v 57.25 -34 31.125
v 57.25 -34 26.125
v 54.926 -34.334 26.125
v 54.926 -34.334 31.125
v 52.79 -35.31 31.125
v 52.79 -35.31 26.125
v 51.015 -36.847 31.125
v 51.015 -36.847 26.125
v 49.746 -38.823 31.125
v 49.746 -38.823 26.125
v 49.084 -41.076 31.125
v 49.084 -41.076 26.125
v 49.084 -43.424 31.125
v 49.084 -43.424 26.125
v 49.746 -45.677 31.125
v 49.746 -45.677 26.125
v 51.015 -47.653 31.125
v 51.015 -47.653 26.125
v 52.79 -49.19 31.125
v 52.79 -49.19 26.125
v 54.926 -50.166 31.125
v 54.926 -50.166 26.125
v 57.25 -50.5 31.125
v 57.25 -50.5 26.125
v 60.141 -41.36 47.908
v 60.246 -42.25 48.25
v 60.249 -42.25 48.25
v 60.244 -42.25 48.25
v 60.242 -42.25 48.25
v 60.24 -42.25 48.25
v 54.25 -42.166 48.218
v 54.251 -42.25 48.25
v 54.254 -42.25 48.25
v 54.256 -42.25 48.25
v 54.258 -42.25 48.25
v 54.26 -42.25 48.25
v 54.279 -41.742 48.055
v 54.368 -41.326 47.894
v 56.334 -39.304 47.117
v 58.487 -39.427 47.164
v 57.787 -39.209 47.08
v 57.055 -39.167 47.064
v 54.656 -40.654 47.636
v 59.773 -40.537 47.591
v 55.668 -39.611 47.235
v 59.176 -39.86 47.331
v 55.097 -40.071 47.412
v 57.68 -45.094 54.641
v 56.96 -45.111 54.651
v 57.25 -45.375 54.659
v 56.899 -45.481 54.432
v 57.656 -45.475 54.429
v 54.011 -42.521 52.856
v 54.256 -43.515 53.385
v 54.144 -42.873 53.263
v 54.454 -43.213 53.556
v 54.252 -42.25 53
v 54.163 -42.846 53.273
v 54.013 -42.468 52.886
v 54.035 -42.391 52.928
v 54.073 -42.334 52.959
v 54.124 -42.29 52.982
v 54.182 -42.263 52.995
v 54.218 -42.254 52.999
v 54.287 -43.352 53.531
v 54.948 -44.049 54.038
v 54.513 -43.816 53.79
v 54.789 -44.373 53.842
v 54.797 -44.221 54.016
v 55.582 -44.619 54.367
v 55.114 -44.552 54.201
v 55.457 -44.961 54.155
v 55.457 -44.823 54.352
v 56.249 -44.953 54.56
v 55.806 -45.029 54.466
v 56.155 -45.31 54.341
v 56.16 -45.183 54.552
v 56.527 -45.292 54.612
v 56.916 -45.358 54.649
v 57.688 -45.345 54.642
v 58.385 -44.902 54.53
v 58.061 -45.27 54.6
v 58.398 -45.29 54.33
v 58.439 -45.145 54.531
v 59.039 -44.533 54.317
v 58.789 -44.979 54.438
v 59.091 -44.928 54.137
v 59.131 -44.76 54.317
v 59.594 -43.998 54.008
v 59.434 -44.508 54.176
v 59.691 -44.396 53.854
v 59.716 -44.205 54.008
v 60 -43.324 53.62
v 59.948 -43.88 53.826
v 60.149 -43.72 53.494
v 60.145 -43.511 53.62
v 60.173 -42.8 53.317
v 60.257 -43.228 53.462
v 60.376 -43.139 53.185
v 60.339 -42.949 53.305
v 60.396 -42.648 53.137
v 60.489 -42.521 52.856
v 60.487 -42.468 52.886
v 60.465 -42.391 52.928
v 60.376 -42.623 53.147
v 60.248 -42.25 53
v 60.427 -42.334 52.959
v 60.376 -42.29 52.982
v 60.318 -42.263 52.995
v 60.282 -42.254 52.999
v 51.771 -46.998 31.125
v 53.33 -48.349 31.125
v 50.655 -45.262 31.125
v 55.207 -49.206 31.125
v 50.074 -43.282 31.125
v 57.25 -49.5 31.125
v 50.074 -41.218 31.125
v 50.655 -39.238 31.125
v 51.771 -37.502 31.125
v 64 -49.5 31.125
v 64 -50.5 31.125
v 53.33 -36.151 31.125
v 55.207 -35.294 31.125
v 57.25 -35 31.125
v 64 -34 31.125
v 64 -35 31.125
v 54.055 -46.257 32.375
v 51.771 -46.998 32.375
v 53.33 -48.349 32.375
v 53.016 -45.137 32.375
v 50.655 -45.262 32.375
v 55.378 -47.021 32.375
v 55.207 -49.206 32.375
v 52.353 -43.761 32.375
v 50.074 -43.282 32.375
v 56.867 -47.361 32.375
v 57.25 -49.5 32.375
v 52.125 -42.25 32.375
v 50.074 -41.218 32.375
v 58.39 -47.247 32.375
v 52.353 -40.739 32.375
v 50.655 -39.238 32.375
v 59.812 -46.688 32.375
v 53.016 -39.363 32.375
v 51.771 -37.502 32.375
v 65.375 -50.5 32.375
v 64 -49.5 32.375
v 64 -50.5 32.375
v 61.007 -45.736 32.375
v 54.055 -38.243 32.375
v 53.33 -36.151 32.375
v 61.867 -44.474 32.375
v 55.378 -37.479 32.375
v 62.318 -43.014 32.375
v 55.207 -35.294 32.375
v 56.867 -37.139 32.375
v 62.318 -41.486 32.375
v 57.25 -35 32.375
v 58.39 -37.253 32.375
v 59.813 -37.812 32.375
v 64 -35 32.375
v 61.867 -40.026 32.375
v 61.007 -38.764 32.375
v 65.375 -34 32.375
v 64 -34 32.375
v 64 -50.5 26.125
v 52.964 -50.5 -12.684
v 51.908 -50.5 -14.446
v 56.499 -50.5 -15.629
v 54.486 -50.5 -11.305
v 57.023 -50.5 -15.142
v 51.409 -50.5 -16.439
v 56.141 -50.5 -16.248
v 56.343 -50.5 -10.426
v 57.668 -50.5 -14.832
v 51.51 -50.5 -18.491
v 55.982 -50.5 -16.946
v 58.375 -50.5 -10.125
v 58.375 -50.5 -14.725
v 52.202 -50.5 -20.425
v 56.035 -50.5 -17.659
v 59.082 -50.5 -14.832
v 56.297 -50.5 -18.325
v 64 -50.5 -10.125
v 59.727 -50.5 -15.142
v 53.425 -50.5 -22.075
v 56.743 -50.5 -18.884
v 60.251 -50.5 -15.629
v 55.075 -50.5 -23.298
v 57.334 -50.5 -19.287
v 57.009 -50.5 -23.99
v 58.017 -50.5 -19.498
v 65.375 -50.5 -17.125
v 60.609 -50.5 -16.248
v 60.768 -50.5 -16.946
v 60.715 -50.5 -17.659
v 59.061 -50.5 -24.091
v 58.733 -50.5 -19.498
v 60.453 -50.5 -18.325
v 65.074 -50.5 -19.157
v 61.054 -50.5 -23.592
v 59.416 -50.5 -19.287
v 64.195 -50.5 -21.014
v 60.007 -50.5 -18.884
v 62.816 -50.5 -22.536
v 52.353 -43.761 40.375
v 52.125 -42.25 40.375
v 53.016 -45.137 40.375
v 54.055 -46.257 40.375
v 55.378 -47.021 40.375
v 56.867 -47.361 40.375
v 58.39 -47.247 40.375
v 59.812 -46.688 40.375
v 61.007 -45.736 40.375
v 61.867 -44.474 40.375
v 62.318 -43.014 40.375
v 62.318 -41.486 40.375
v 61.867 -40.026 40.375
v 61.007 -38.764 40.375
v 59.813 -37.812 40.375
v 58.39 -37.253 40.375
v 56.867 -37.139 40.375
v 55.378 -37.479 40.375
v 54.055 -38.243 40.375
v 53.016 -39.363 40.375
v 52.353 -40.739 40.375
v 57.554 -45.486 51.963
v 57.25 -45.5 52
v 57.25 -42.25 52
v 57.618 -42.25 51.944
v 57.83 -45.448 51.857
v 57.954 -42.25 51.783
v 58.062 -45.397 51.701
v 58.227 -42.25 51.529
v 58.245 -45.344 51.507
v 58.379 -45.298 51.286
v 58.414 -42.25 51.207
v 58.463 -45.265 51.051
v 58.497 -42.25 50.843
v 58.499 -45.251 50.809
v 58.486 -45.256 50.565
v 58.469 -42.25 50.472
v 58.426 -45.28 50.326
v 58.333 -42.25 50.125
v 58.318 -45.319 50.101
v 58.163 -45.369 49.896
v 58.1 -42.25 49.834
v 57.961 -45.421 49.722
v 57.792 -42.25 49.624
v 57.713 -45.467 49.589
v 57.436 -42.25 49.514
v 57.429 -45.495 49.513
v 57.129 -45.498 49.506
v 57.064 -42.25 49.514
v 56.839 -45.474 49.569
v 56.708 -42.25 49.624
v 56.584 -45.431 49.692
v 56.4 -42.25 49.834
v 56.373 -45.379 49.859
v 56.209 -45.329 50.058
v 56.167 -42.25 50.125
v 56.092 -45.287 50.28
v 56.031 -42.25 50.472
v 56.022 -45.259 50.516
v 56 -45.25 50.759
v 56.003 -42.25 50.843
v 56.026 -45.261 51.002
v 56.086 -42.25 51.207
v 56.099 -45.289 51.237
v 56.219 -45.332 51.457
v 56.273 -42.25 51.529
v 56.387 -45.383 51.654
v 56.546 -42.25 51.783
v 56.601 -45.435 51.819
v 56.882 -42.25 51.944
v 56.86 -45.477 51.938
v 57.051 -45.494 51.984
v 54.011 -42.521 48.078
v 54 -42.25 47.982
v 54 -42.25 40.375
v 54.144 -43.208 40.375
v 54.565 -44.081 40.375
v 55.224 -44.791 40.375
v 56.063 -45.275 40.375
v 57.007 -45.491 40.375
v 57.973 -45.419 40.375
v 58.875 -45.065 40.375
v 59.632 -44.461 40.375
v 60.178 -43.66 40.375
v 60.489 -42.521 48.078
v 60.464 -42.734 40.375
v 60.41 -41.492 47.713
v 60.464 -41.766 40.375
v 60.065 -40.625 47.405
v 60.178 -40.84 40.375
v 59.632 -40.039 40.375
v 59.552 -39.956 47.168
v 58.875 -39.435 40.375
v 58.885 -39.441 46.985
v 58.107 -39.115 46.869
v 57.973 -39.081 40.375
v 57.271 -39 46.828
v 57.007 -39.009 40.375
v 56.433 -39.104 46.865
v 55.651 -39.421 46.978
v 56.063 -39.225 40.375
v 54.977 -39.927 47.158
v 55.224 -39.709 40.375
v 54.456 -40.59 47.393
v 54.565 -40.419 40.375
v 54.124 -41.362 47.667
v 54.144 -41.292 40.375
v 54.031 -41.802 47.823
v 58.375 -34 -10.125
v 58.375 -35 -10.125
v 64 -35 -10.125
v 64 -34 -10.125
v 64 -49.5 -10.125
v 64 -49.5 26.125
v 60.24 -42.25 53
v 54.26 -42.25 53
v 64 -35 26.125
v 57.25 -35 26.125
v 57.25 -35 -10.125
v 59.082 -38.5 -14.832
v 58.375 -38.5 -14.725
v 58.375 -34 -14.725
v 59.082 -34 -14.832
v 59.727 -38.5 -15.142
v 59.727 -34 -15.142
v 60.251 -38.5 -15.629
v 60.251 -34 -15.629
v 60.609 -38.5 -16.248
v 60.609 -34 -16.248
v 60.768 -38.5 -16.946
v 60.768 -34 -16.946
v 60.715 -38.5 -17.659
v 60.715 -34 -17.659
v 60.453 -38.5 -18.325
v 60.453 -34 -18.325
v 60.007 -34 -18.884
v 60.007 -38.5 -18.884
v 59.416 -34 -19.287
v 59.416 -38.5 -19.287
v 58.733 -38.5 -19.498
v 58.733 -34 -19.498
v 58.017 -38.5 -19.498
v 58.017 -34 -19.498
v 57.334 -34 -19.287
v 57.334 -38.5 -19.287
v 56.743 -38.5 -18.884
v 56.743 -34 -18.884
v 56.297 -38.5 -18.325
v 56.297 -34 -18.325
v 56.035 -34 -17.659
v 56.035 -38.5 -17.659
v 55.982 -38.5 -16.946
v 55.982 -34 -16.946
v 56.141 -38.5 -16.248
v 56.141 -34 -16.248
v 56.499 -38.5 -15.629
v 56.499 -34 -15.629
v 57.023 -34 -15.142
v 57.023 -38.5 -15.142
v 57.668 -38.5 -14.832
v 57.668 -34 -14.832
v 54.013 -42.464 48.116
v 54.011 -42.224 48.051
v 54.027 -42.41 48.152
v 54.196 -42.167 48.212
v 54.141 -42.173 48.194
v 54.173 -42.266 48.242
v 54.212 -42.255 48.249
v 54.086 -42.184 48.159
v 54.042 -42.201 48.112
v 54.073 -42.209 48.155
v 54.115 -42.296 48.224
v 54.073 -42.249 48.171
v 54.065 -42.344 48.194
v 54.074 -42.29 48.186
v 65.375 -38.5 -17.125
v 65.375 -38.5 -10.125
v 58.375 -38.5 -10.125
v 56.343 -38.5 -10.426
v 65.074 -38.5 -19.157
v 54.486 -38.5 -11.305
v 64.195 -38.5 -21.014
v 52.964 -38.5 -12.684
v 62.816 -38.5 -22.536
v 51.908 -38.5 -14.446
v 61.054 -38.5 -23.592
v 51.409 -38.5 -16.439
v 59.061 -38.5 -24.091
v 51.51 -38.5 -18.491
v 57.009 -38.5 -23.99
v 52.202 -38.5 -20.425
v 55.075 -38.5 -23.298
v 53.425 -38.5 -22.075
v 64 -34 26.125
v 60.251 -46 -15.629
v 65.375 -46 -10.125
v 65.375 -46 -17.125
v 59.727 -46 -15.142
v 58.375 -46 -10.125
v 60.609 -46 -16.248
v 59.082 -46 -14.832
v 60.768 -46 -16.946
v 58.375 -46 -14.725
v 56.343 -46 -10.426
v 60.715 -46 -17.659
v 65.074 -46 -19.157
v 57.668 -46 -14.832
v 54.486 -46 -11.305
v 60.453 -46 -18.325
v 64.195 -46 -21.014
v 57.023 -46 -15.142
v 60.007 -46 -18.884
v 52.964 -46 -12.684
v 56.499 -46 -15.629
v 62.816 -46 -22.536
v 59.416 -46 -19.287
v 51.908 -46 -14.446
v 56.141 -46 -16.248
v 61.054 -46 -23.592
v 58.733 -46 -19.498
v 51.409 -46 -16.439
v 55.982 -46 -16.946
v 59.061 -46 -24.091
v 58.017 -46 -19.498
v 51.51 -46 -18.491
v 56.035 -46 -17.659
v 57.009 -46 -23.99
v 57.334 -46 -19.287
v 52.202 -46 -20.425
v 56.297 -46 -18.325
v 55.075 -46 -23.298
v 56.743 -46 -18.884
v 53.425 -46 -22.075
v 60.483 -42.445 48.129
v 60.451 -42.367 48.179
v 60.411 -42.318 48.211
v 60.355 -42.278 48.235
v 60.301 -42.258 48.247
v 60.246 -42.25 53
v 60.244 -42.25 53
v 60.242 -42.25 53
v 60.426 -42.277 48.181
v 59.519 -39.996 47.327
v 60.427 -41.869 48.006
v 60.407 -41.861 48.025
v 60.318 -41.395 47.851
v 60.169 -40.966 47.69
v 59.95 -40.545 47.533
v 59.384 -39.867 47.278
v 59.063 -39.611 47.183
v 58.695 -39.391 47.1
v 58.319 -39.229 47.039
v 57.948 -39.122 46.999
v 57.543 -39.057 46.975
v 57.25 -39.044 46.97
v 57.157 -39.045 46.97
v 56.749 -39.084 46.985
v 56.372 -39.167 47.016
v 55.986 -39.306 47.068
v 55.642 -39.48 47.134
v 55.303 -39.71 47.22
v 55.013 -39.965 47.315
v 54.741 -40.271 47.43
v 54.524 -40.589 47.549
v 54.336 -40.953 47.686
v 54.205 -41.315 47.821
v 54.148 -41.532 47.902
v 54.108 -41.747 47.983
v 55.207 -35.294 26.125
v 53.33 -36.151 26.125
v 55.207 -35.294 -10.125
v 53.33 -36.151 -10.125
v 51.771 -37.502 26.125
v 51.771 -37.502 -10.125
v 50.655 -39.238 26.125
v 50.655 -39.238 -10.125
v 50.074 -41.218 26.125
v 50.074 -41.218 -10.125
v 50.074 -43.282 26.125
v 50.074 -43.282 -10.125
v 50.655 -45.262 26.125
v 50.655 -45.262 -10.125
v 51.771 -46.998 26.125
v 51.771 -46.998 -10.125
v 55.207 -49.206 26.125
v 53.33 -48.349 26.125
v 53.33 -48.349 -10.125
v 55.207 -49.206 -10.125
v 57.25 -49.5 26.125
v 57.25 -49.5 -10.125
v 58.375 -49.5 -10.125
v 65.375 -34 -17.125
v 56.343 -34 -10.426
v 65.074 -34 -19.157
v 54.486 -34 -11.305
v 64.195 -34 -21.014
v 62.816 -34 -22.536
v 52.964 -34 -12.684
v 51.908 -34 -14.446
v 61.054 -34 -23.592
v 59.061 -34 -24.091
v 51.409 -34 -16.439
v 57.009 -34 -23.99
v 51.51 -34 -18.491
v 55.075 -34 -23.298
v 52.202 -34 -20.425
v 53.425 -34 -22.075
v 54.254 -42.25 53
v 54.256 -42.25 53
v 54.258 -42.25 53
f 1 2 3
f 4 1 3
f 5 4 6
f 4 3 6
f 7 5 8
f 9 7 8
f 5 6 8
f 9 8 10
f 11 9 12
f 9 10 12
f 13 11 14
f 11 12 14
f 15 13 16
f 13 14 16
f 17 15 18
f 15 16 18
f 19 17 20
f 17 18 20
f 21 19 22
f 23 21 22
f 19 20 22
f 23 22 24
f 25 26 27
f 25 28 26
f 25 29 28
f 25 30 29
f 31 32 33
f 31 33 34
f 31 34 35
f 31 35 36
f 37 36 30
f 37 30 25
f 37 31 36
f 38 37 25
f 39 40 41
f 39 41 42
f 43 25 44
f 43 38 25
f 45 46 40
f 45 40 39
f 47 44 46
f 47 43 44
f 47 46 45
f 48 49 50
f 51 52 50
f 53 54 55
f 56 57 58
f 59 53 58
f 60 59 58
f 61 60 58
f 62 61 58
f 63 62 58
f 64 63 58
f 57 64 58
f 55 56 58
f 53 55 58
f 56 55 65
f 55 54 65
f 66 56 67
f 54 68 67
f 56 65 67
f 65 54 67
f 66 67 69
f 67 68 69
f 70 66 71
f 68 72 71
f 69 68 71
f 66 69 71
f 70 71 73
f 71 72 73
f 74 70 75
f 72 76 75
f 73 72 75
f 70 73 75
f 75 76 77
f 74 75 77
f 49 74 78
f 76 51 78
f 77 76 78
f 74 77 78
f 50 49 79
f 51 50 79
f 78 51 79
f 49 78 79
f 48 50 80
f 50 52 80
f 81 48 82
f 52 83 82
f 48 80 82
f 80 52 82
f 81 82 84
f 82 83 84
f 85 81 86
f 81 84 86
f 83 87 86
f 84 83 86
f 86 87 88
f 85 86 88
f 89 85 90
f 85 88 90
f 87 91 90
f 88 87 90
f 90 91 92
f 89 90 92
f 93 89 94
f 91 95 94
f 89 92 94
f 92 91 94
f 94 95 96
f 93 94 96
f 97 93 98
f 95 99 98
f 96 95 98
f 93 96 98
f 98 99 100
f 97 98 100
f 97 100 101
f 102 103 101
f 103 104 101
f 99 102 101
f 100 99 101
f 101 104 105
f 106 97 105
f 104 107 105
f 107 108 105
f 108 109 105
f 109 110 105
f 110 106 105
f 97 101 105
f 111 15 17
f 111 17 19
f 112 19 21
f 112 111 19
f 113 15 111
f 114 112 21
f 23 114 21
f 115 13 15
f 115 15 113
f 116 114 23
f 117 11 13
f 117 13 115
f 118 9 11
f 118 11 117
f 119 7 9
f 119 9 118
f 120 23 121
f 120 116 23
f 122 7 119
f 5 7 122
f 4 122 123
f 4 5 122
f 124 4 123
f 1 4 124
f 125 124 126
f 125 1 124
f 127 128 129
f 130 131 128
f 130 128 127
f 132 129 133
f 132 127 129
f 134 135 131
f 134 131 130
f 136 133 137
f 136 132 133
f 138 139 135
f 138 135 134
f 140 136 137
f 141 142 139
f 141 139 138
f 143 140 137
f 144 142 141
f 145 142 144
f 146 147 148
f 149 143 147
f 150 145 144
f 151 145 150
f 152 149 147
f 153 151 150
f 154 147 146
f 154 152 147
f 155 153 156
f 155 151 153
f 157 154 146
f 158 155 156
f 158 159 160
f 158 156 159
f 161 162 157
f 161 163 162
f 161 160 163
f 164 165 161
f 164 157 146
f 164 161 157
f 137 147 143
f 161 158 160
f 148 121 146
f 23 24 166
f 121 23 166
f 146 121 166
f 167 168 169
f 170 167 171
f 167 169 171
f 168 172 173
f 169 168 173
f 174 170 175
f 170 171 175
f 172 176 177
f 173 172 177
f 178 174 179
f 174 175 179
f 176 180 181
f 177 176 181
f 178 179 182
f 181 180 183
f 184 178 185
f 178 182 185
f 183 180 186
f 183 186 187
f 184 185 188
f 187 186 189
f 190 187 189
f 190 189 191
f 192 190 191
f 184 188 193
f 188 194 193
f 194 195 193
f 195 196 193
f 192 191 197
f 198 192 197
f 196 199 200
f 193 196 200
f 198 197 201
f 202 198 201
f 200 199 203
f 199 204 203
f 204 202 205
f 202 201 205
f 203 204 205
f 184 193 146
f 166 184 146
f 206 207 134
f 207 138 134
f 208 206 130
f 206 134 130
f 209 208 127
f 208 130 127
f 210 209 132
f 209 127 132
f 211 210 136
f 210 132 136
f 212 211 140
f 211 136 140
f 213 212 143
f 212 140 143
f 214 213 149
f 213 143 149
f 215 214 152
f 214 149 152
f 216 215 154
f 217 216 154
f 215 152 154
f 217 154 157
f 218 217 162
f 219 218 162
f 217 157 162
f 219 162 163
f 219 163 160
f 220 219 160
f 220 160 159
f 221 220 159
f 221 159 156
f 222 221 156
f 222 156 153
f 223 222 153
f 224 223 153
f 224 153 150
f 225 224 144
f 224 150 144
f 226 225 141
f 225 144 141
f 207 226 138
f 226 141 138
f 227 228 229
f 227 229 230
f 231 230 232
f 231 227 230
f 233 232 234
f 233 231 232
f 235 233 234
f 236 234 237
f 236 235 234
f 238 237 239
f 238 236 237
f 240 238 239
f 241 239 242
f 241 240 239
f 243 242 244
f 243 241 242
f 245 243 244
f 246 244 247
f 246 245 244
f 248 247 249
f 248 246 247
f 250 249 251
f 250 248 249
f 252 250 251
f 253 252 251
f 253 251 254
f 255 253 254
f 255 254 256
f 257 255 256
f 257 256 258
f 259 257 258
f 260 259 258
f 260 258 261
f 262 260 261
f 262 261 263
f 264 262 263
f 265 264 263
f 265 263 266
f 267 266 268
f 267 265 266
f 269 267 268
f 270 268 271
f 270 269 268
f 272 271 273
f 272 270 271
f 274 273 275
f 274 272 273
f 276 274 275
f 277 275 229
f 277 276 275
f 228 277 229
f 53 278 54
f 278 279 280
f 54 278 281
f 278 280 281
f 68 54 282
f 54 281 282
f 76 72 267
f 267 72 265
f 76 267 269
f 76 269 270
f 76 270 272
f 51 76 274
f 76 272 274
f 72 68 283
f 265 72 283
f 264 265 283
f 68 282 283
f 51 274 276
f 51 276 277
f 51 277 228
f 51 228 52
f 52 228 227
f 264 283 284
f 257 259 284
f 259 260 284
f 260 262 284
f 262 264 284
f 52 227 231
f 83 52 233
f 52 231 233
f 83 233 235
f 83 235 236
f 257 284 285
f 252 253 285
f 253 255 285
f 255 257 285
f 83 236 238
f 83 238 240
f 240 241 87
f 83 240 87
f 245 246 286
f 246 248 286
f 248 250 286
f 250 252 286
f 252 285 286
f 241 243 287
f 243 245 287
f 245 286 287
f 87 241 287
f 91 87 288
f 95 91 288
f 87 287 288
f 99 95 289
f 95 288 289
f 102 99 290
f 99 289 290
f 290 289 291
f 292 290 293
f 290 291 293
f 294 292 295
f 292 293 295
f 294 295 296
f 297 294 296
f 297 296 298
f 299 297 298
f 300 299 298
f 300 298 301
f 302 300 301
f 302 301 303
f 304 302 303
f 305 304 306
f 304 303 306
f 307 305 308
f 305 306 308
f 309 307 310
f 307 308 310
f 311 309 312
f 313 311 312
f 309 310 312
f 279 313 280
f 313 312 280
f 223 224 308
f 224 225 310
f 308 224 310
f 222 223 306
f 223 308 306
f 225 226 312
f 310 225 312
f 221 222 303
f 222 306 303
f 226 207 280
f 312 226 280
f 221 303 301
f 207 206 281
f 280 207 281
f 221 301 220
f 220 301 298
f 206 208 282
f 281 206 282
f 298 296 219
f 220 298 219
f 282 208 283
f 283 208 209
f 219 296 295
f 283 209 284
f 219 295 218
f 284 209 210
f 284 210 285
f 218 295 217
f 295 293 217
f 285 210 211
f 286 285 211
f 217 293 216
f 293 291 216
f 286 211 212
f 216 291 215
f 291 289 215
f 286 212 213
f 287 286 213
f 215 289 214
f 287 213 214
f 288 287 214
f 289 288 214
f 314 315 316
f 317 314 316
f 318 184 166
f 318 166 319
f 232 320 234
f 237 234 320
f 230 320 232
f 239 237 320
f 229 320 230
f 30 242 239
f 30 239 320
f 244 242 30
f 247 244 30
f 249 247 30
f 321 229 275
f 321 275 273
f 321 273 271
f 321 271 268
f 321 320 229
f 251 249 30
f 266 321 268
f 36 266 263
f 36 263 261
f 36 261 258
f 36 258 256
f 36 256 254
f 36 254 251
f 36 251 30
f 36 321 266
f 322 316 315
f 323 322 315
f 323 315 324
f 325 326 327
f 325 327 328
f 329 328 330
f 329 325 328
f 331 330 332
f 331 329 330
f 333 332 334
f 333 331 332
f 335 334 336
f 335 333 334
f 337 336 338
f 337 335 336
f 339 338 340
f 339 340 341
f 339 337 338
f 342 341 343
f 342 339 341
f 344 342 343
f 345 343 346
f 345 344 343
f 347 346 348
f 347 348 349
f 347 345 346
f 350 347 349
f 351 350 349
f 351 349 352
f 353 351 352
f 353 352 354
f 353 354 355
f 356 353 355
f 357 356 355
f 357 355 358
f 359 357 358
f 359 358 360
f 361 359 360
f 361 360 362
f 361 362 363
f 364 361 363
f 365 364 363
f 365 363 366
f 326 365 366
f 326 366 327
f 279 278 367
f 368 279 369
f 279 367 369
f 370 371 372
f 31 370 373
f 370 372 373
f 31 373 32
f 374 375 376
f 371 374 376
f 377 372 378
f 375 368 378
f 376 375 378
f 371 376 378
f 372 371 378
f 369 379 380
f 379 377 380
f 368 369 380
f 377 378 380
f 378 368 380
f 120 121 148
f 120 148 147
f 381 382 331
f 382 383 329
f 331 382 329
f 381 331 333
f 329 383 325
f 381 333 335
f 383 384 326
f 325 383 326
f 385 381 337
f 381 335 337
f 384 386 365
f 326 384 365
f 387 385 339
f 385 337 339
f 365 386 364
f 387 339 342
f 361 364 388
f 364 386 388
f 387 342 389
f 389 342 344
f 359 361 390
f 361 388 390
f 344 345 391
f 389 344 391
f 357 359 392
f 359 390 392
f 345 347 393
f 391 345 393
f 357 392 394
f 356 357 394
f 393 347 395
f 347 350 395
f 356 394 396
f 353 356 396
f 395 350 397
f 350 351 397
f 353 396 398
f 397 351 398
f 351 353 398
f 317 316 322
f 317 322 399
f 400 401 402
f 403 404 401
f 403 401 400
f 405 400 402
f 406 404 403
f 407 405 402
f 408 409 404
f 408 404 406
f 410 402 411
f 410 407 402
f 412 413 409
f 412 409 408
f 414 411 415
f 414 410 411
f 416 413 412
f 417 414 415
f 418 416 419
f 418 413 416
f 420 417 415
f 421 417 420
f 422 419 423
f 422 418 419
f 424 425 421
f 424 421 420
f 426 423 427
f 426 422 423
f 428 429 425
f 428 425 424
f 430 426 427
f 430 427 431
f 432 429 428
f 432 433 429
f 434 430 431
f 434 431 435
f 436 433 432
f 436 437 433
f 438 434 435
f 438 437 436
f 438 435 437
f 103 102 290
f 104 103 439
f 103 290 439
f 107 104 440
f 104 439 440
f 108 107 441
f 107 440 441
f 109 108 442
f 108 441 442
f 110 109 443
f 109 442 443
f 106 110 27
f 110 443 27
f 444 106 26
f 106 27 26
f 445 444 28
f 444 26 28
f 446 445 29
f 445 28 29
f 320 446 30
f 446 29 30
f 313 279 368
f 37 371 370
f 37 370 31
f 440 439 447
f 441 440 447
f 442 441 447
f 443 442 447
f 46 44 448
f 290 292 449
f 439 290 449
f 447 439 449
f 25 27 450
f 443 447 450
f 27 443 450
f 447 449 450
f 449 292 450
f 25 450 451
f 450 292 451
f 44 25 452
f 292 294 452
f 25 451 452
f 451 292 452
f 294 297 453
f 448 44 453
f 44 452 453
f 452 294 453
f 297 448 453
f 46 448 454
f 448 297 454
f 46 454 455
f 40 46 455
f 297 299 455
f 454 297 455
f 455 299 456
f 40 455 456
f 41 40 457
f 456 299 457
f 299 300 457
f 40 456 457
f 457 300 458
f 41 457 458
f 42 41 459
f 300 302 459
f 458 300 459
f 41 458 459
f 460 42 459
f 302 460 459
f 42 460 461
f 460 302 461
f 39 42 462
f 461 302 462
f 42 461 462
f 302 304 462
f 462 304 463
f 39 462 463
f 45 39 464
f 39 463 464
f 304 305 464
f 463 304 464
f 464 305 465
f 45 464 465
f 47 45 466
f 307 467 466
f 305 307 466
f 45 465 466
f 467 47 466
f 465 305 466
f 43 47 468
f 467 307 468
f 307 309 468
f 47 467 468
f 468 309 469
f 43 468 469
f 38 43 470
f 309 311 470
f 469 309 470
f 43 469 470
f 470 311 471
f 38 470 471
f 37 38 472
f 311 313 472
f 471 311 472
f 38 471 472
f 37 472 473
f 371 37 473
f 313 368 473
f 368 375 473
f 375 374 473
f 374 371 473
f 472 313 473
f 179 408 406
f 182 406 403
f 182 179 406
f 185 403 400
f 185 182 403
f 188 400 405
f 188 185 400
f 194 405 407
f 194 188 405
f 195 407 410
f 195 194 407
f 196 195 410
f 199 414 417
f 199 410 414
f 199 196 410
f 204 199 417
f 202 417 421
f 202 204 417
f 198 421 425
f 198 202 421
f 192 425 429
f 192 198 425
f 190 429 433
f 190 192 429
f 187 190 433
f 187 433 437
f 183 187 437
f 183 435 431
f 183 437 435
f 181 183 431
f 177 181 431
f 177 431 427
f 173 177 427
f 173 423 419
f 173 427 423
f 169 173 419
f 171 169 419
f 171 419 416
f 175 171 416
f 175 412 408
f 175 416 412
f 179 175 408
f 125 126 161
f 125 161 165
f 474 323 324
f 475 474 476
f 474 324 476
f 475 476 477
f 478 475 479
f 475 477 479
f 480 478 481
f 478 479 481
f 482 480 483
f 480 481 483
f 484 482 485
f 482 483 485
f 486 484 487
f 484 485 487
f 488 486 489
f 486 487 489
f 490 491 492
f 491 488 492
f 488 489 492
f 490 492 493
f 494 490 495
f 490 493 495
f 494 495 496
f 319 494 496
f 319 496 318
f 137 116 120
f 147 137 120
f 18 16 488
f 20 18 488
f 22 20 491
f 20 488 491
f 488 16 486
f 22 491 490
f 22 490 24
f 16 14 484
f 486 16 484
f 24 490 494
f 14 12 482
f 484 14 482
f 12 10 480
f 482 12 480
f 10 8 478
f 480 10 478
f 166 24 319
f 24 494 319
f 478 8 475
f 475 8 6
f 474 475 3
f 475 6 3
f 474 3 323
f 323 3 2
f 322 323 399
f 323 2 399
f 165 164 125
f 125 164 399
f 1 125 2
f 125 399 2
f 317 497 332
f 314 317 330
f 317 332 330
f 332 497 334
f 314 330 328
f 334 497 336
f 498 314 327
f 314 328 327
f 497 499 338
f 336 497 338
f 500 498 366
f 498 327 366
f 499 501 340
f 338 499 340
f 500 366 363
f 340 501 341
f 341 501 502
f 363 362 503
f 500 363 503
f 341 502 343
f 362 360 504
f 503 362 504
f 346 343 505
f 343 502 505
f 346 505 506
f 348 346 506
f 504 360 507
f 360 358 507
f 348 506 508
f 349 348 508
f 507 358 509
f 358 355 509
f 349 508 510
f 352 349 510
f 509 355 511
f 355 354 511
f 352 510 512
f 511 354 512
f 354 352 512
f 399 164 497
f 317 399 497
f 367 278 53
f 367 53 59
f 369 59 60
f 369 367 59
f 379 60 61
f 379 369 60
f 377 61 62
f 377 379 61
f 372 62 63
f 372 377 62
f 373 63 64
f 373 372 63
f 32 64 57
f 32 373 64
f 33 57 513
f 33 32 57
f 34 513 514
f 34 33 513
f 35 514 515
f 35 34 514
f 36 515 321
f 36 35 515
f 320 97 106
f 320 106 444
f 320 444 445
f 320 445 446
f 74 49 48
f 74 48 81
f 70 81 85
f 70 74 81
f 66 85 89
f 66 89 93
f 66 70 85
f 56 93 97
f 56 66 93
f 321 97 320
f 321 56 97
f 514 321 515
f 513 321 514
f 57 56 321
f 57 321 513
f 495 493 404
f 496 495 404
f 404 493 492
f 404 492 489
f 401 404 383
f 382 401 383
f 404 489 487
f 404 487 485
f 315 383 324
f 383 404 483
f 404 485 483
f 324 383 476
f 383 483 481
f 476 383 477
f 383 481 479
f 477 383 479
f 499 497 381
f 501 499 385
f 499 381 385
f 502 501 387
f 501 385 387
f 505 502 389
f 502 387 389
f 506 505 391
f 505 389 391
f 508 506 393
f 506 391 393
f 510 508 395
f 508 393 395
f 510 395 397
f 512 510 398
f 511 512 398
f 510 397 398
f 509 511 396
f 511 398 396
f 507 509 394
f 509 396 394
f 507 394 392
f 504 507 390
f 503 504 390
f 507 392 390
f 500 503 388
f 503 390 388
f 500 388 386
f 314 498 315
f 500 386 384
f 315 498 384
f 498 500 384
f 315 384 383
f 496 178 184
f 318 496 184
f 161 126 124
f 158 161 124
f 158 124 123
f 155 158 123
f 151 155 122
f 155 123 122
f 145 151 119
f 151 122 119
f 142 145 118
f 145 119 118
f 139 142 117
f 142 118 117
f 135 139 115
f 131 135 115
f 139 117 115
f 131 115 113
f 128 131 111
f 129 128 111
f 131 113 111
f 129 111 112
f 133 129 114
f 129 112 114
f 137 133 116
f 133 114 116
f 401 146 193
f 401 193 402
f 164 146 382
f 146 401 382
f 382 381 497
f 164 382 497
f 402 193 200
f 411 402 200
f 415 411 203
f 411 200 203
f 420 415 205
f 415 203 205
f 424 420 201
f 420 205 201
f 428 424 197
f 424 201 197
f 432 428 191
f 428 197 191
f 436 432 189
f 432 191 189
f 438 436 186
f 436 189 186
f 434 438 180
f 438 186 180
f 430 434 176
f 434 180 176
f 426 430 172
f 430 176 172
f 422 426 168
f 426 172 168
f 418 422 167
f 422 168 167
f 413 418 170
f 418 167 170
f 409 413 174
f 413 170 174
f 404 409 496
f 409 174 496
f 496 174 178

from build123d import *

# Parameters (mm, degrees)
SKETCH_1_R               = 2.4
EXTRUDE_1_DEPTH          = 16.5
EXTRUDE_2_DEPTH          = 42.5
EXTRUDE_START            = -6.25
EXTRUDE_3_DEPTH          = 5
CUT_EXTRUDE_1_DEPTH      = 100.173616703
CUT_EXTRUDE_1_DEPTH_BACK = 100.173616703
CUT_EXTRUDE_2_DEPTH      = 86.750911074
CUT_EXTRUDE_2_DEPTH_BACK = 86.750911074
SKETCH_7_R               = 1.25
FILLET_1_R               = 0.25
CUT_EXTRUDE_3_DEPTH      = 100.072557411
CUT_EXTRUDE_3_DEPTH_BACK = 100.072557411


with BuildPart() as part:
    # 草图1 → 凸台-拉伸1 (new body)
    with BuildSketch(Plane(origin=(0, -50.5, 0), x_dir=(1, 0, 0), z_dir=(0, 1, 0))):
        with BuildLine():
            ThreePointArc((65.375, 17.125), (53.425252532, 22.074747468), (58.375, 10.125))
            Line((58.375, 10.125), (65.375, 10.125))
            Line((65.375, 10.125), (65.375, 17.125))
        make_face()
        with Locations((58.375, 17.125)):
            Circle(SKETCH_1_R, mode=Mode.SUBTRACT)
    extrude(amount=EXTRUDE_1_DEPTH)

    # 草图2 → 凸台-拉伸2 (add)
    with BuildSketch(Plane.XY.offset(-10.125)):
        with BuildLine():
            Line((64, -50.5), (65.375, -50.5))
            Line((65.375, -50.5), (65.375, -34))
            Line((65.375, -34), (64, -34))
            Line((64, -34), (64, -35))
            Line((64, -35), (57.25, -35))
            ThreePointArc((57.25, -35), (50, -42.25), (57.25, -49.5))
            Line((57.25, -49.5), (64, -49.5))
            Line((64, -49.5), (64, -50.5))
        make_face()
    extrude(amount=EXTRUDE_2_DEPTH)

    # 草图3 → 凸台-拉伸3 (add)
    with BuildSketch(Plane.XY.offset(32.375).offset(EXTRUDE_START)):
        with BuildLine():
            ThreePointArc((57.25, -49.5), (50, -42.25), (57.25, -35))
            Line((57.25, -35), (65.375, -35))
            Line((65.375, -35), (65.375, -34))
            Line((65.375, -34), (57.25, -34))
            ThreePointArc((57.25, -34), (49, -42.25), (57.25, -50.5))
            Line((57.25, -50.5), (65.375, -50.5))
            Line((65.375, -50.5), (65.375, -49.5))
            Line((65.375, -49.5), (57.25, -49.5))
        make_face()
    extrude(amount=EXTRUDE_3_DEPTH)

    # 草图5 → 旋转1 (revolve)
    with BuildSketch(Plane(origin=(0, -42.25, 0), x_dir=(1, 0, 0), z_dir=(0, 1, 0))):
        Polygon((62.375, -32.375), (57.25, -32.375), (57.25, -54.875), (60.5, -54.875), (60.5, -40.375), (62.375, -40.375), align=None)
    revolve(axis=Axis((57.25, -42.25, 32.375), (0, 0, 1)))

    # 草图6 → 切除-拉伸1 (cut, two sides: drawn at the far end of the back side and taken through both)
    with BuildSketch(Plane(origin=(0, 0, 0), x_dir=(0, 0, -1), z_dir=(1, 0, 0)).offset(-CUT_EXTRUDE_1_DEPTH_BACK)):
        Polygon((-48.25, -42.25), (-47, -39), (-54.875, -39), (-54.875, -45.5), (-53, -42.25), align=None)
    extrude(amount=CUT_EXTRUDE_1_DEPTH + CUT_EXTRUDE_1_DEPTH_BACK, mode=Mode.SUBTRACT)

    # 草图7 → 切除-拉伸2 (cut, two sides: drawn at the far end of the back side and taken through both)
    with BuildSketch(Plane(origin=(0, -42.25, 0), x_dir=(1, 0, 0), z_dir=(0, 1, 0)).offset(-CUT_EXTRUDE_2_DEPTH_BACK)):
        with Locations((57.25, -50.75)):
            Circle(SKETCH_7_R)
    extrude(amount=CUT_EXTRUDE_2_DEPTH + CUT_EXTRUDE_2_DEPTH_BACK, mode=Mode.SUBTRACT)

    # 圆角1
    fillet_1_edges = [part.edges().sort_by_distance(p)[0] for p in [
        (59.628523426, -44.464751975, 54.277741524),
        (54, -42.25, 50.625),
        (60.5, -42.25, 50.625),
        (59.587314609, -39.99180151, 47.381462119),
    ]]
    fillet(fillet_1_edges, radius=FILLET_1_R)

    # 草图8 → 切除-拉伸3 (cut, two sides: drawn at the far end of the back side and taken through both)
    with BuildSketch(Plane(origin=(0, 0, 0), x_dir=(0, 0, -1), z_dir=(1, 0, 0)).offset(-CUT_EXTRUDE_3_DEPTH_BACK)):
        Polygon((25.79116453, -38.5), (10.125, -38.5), (10.125, -46), (25.79116453, -46), (25.79116453, -42.25), align=None)
    extrude(amount=CUT_EXTRUDE_3_DEPTH + CUT_EXTRUDE_3_DEPTH_BACK, mode=Mode.SUBTRACT)


solid = part.part
